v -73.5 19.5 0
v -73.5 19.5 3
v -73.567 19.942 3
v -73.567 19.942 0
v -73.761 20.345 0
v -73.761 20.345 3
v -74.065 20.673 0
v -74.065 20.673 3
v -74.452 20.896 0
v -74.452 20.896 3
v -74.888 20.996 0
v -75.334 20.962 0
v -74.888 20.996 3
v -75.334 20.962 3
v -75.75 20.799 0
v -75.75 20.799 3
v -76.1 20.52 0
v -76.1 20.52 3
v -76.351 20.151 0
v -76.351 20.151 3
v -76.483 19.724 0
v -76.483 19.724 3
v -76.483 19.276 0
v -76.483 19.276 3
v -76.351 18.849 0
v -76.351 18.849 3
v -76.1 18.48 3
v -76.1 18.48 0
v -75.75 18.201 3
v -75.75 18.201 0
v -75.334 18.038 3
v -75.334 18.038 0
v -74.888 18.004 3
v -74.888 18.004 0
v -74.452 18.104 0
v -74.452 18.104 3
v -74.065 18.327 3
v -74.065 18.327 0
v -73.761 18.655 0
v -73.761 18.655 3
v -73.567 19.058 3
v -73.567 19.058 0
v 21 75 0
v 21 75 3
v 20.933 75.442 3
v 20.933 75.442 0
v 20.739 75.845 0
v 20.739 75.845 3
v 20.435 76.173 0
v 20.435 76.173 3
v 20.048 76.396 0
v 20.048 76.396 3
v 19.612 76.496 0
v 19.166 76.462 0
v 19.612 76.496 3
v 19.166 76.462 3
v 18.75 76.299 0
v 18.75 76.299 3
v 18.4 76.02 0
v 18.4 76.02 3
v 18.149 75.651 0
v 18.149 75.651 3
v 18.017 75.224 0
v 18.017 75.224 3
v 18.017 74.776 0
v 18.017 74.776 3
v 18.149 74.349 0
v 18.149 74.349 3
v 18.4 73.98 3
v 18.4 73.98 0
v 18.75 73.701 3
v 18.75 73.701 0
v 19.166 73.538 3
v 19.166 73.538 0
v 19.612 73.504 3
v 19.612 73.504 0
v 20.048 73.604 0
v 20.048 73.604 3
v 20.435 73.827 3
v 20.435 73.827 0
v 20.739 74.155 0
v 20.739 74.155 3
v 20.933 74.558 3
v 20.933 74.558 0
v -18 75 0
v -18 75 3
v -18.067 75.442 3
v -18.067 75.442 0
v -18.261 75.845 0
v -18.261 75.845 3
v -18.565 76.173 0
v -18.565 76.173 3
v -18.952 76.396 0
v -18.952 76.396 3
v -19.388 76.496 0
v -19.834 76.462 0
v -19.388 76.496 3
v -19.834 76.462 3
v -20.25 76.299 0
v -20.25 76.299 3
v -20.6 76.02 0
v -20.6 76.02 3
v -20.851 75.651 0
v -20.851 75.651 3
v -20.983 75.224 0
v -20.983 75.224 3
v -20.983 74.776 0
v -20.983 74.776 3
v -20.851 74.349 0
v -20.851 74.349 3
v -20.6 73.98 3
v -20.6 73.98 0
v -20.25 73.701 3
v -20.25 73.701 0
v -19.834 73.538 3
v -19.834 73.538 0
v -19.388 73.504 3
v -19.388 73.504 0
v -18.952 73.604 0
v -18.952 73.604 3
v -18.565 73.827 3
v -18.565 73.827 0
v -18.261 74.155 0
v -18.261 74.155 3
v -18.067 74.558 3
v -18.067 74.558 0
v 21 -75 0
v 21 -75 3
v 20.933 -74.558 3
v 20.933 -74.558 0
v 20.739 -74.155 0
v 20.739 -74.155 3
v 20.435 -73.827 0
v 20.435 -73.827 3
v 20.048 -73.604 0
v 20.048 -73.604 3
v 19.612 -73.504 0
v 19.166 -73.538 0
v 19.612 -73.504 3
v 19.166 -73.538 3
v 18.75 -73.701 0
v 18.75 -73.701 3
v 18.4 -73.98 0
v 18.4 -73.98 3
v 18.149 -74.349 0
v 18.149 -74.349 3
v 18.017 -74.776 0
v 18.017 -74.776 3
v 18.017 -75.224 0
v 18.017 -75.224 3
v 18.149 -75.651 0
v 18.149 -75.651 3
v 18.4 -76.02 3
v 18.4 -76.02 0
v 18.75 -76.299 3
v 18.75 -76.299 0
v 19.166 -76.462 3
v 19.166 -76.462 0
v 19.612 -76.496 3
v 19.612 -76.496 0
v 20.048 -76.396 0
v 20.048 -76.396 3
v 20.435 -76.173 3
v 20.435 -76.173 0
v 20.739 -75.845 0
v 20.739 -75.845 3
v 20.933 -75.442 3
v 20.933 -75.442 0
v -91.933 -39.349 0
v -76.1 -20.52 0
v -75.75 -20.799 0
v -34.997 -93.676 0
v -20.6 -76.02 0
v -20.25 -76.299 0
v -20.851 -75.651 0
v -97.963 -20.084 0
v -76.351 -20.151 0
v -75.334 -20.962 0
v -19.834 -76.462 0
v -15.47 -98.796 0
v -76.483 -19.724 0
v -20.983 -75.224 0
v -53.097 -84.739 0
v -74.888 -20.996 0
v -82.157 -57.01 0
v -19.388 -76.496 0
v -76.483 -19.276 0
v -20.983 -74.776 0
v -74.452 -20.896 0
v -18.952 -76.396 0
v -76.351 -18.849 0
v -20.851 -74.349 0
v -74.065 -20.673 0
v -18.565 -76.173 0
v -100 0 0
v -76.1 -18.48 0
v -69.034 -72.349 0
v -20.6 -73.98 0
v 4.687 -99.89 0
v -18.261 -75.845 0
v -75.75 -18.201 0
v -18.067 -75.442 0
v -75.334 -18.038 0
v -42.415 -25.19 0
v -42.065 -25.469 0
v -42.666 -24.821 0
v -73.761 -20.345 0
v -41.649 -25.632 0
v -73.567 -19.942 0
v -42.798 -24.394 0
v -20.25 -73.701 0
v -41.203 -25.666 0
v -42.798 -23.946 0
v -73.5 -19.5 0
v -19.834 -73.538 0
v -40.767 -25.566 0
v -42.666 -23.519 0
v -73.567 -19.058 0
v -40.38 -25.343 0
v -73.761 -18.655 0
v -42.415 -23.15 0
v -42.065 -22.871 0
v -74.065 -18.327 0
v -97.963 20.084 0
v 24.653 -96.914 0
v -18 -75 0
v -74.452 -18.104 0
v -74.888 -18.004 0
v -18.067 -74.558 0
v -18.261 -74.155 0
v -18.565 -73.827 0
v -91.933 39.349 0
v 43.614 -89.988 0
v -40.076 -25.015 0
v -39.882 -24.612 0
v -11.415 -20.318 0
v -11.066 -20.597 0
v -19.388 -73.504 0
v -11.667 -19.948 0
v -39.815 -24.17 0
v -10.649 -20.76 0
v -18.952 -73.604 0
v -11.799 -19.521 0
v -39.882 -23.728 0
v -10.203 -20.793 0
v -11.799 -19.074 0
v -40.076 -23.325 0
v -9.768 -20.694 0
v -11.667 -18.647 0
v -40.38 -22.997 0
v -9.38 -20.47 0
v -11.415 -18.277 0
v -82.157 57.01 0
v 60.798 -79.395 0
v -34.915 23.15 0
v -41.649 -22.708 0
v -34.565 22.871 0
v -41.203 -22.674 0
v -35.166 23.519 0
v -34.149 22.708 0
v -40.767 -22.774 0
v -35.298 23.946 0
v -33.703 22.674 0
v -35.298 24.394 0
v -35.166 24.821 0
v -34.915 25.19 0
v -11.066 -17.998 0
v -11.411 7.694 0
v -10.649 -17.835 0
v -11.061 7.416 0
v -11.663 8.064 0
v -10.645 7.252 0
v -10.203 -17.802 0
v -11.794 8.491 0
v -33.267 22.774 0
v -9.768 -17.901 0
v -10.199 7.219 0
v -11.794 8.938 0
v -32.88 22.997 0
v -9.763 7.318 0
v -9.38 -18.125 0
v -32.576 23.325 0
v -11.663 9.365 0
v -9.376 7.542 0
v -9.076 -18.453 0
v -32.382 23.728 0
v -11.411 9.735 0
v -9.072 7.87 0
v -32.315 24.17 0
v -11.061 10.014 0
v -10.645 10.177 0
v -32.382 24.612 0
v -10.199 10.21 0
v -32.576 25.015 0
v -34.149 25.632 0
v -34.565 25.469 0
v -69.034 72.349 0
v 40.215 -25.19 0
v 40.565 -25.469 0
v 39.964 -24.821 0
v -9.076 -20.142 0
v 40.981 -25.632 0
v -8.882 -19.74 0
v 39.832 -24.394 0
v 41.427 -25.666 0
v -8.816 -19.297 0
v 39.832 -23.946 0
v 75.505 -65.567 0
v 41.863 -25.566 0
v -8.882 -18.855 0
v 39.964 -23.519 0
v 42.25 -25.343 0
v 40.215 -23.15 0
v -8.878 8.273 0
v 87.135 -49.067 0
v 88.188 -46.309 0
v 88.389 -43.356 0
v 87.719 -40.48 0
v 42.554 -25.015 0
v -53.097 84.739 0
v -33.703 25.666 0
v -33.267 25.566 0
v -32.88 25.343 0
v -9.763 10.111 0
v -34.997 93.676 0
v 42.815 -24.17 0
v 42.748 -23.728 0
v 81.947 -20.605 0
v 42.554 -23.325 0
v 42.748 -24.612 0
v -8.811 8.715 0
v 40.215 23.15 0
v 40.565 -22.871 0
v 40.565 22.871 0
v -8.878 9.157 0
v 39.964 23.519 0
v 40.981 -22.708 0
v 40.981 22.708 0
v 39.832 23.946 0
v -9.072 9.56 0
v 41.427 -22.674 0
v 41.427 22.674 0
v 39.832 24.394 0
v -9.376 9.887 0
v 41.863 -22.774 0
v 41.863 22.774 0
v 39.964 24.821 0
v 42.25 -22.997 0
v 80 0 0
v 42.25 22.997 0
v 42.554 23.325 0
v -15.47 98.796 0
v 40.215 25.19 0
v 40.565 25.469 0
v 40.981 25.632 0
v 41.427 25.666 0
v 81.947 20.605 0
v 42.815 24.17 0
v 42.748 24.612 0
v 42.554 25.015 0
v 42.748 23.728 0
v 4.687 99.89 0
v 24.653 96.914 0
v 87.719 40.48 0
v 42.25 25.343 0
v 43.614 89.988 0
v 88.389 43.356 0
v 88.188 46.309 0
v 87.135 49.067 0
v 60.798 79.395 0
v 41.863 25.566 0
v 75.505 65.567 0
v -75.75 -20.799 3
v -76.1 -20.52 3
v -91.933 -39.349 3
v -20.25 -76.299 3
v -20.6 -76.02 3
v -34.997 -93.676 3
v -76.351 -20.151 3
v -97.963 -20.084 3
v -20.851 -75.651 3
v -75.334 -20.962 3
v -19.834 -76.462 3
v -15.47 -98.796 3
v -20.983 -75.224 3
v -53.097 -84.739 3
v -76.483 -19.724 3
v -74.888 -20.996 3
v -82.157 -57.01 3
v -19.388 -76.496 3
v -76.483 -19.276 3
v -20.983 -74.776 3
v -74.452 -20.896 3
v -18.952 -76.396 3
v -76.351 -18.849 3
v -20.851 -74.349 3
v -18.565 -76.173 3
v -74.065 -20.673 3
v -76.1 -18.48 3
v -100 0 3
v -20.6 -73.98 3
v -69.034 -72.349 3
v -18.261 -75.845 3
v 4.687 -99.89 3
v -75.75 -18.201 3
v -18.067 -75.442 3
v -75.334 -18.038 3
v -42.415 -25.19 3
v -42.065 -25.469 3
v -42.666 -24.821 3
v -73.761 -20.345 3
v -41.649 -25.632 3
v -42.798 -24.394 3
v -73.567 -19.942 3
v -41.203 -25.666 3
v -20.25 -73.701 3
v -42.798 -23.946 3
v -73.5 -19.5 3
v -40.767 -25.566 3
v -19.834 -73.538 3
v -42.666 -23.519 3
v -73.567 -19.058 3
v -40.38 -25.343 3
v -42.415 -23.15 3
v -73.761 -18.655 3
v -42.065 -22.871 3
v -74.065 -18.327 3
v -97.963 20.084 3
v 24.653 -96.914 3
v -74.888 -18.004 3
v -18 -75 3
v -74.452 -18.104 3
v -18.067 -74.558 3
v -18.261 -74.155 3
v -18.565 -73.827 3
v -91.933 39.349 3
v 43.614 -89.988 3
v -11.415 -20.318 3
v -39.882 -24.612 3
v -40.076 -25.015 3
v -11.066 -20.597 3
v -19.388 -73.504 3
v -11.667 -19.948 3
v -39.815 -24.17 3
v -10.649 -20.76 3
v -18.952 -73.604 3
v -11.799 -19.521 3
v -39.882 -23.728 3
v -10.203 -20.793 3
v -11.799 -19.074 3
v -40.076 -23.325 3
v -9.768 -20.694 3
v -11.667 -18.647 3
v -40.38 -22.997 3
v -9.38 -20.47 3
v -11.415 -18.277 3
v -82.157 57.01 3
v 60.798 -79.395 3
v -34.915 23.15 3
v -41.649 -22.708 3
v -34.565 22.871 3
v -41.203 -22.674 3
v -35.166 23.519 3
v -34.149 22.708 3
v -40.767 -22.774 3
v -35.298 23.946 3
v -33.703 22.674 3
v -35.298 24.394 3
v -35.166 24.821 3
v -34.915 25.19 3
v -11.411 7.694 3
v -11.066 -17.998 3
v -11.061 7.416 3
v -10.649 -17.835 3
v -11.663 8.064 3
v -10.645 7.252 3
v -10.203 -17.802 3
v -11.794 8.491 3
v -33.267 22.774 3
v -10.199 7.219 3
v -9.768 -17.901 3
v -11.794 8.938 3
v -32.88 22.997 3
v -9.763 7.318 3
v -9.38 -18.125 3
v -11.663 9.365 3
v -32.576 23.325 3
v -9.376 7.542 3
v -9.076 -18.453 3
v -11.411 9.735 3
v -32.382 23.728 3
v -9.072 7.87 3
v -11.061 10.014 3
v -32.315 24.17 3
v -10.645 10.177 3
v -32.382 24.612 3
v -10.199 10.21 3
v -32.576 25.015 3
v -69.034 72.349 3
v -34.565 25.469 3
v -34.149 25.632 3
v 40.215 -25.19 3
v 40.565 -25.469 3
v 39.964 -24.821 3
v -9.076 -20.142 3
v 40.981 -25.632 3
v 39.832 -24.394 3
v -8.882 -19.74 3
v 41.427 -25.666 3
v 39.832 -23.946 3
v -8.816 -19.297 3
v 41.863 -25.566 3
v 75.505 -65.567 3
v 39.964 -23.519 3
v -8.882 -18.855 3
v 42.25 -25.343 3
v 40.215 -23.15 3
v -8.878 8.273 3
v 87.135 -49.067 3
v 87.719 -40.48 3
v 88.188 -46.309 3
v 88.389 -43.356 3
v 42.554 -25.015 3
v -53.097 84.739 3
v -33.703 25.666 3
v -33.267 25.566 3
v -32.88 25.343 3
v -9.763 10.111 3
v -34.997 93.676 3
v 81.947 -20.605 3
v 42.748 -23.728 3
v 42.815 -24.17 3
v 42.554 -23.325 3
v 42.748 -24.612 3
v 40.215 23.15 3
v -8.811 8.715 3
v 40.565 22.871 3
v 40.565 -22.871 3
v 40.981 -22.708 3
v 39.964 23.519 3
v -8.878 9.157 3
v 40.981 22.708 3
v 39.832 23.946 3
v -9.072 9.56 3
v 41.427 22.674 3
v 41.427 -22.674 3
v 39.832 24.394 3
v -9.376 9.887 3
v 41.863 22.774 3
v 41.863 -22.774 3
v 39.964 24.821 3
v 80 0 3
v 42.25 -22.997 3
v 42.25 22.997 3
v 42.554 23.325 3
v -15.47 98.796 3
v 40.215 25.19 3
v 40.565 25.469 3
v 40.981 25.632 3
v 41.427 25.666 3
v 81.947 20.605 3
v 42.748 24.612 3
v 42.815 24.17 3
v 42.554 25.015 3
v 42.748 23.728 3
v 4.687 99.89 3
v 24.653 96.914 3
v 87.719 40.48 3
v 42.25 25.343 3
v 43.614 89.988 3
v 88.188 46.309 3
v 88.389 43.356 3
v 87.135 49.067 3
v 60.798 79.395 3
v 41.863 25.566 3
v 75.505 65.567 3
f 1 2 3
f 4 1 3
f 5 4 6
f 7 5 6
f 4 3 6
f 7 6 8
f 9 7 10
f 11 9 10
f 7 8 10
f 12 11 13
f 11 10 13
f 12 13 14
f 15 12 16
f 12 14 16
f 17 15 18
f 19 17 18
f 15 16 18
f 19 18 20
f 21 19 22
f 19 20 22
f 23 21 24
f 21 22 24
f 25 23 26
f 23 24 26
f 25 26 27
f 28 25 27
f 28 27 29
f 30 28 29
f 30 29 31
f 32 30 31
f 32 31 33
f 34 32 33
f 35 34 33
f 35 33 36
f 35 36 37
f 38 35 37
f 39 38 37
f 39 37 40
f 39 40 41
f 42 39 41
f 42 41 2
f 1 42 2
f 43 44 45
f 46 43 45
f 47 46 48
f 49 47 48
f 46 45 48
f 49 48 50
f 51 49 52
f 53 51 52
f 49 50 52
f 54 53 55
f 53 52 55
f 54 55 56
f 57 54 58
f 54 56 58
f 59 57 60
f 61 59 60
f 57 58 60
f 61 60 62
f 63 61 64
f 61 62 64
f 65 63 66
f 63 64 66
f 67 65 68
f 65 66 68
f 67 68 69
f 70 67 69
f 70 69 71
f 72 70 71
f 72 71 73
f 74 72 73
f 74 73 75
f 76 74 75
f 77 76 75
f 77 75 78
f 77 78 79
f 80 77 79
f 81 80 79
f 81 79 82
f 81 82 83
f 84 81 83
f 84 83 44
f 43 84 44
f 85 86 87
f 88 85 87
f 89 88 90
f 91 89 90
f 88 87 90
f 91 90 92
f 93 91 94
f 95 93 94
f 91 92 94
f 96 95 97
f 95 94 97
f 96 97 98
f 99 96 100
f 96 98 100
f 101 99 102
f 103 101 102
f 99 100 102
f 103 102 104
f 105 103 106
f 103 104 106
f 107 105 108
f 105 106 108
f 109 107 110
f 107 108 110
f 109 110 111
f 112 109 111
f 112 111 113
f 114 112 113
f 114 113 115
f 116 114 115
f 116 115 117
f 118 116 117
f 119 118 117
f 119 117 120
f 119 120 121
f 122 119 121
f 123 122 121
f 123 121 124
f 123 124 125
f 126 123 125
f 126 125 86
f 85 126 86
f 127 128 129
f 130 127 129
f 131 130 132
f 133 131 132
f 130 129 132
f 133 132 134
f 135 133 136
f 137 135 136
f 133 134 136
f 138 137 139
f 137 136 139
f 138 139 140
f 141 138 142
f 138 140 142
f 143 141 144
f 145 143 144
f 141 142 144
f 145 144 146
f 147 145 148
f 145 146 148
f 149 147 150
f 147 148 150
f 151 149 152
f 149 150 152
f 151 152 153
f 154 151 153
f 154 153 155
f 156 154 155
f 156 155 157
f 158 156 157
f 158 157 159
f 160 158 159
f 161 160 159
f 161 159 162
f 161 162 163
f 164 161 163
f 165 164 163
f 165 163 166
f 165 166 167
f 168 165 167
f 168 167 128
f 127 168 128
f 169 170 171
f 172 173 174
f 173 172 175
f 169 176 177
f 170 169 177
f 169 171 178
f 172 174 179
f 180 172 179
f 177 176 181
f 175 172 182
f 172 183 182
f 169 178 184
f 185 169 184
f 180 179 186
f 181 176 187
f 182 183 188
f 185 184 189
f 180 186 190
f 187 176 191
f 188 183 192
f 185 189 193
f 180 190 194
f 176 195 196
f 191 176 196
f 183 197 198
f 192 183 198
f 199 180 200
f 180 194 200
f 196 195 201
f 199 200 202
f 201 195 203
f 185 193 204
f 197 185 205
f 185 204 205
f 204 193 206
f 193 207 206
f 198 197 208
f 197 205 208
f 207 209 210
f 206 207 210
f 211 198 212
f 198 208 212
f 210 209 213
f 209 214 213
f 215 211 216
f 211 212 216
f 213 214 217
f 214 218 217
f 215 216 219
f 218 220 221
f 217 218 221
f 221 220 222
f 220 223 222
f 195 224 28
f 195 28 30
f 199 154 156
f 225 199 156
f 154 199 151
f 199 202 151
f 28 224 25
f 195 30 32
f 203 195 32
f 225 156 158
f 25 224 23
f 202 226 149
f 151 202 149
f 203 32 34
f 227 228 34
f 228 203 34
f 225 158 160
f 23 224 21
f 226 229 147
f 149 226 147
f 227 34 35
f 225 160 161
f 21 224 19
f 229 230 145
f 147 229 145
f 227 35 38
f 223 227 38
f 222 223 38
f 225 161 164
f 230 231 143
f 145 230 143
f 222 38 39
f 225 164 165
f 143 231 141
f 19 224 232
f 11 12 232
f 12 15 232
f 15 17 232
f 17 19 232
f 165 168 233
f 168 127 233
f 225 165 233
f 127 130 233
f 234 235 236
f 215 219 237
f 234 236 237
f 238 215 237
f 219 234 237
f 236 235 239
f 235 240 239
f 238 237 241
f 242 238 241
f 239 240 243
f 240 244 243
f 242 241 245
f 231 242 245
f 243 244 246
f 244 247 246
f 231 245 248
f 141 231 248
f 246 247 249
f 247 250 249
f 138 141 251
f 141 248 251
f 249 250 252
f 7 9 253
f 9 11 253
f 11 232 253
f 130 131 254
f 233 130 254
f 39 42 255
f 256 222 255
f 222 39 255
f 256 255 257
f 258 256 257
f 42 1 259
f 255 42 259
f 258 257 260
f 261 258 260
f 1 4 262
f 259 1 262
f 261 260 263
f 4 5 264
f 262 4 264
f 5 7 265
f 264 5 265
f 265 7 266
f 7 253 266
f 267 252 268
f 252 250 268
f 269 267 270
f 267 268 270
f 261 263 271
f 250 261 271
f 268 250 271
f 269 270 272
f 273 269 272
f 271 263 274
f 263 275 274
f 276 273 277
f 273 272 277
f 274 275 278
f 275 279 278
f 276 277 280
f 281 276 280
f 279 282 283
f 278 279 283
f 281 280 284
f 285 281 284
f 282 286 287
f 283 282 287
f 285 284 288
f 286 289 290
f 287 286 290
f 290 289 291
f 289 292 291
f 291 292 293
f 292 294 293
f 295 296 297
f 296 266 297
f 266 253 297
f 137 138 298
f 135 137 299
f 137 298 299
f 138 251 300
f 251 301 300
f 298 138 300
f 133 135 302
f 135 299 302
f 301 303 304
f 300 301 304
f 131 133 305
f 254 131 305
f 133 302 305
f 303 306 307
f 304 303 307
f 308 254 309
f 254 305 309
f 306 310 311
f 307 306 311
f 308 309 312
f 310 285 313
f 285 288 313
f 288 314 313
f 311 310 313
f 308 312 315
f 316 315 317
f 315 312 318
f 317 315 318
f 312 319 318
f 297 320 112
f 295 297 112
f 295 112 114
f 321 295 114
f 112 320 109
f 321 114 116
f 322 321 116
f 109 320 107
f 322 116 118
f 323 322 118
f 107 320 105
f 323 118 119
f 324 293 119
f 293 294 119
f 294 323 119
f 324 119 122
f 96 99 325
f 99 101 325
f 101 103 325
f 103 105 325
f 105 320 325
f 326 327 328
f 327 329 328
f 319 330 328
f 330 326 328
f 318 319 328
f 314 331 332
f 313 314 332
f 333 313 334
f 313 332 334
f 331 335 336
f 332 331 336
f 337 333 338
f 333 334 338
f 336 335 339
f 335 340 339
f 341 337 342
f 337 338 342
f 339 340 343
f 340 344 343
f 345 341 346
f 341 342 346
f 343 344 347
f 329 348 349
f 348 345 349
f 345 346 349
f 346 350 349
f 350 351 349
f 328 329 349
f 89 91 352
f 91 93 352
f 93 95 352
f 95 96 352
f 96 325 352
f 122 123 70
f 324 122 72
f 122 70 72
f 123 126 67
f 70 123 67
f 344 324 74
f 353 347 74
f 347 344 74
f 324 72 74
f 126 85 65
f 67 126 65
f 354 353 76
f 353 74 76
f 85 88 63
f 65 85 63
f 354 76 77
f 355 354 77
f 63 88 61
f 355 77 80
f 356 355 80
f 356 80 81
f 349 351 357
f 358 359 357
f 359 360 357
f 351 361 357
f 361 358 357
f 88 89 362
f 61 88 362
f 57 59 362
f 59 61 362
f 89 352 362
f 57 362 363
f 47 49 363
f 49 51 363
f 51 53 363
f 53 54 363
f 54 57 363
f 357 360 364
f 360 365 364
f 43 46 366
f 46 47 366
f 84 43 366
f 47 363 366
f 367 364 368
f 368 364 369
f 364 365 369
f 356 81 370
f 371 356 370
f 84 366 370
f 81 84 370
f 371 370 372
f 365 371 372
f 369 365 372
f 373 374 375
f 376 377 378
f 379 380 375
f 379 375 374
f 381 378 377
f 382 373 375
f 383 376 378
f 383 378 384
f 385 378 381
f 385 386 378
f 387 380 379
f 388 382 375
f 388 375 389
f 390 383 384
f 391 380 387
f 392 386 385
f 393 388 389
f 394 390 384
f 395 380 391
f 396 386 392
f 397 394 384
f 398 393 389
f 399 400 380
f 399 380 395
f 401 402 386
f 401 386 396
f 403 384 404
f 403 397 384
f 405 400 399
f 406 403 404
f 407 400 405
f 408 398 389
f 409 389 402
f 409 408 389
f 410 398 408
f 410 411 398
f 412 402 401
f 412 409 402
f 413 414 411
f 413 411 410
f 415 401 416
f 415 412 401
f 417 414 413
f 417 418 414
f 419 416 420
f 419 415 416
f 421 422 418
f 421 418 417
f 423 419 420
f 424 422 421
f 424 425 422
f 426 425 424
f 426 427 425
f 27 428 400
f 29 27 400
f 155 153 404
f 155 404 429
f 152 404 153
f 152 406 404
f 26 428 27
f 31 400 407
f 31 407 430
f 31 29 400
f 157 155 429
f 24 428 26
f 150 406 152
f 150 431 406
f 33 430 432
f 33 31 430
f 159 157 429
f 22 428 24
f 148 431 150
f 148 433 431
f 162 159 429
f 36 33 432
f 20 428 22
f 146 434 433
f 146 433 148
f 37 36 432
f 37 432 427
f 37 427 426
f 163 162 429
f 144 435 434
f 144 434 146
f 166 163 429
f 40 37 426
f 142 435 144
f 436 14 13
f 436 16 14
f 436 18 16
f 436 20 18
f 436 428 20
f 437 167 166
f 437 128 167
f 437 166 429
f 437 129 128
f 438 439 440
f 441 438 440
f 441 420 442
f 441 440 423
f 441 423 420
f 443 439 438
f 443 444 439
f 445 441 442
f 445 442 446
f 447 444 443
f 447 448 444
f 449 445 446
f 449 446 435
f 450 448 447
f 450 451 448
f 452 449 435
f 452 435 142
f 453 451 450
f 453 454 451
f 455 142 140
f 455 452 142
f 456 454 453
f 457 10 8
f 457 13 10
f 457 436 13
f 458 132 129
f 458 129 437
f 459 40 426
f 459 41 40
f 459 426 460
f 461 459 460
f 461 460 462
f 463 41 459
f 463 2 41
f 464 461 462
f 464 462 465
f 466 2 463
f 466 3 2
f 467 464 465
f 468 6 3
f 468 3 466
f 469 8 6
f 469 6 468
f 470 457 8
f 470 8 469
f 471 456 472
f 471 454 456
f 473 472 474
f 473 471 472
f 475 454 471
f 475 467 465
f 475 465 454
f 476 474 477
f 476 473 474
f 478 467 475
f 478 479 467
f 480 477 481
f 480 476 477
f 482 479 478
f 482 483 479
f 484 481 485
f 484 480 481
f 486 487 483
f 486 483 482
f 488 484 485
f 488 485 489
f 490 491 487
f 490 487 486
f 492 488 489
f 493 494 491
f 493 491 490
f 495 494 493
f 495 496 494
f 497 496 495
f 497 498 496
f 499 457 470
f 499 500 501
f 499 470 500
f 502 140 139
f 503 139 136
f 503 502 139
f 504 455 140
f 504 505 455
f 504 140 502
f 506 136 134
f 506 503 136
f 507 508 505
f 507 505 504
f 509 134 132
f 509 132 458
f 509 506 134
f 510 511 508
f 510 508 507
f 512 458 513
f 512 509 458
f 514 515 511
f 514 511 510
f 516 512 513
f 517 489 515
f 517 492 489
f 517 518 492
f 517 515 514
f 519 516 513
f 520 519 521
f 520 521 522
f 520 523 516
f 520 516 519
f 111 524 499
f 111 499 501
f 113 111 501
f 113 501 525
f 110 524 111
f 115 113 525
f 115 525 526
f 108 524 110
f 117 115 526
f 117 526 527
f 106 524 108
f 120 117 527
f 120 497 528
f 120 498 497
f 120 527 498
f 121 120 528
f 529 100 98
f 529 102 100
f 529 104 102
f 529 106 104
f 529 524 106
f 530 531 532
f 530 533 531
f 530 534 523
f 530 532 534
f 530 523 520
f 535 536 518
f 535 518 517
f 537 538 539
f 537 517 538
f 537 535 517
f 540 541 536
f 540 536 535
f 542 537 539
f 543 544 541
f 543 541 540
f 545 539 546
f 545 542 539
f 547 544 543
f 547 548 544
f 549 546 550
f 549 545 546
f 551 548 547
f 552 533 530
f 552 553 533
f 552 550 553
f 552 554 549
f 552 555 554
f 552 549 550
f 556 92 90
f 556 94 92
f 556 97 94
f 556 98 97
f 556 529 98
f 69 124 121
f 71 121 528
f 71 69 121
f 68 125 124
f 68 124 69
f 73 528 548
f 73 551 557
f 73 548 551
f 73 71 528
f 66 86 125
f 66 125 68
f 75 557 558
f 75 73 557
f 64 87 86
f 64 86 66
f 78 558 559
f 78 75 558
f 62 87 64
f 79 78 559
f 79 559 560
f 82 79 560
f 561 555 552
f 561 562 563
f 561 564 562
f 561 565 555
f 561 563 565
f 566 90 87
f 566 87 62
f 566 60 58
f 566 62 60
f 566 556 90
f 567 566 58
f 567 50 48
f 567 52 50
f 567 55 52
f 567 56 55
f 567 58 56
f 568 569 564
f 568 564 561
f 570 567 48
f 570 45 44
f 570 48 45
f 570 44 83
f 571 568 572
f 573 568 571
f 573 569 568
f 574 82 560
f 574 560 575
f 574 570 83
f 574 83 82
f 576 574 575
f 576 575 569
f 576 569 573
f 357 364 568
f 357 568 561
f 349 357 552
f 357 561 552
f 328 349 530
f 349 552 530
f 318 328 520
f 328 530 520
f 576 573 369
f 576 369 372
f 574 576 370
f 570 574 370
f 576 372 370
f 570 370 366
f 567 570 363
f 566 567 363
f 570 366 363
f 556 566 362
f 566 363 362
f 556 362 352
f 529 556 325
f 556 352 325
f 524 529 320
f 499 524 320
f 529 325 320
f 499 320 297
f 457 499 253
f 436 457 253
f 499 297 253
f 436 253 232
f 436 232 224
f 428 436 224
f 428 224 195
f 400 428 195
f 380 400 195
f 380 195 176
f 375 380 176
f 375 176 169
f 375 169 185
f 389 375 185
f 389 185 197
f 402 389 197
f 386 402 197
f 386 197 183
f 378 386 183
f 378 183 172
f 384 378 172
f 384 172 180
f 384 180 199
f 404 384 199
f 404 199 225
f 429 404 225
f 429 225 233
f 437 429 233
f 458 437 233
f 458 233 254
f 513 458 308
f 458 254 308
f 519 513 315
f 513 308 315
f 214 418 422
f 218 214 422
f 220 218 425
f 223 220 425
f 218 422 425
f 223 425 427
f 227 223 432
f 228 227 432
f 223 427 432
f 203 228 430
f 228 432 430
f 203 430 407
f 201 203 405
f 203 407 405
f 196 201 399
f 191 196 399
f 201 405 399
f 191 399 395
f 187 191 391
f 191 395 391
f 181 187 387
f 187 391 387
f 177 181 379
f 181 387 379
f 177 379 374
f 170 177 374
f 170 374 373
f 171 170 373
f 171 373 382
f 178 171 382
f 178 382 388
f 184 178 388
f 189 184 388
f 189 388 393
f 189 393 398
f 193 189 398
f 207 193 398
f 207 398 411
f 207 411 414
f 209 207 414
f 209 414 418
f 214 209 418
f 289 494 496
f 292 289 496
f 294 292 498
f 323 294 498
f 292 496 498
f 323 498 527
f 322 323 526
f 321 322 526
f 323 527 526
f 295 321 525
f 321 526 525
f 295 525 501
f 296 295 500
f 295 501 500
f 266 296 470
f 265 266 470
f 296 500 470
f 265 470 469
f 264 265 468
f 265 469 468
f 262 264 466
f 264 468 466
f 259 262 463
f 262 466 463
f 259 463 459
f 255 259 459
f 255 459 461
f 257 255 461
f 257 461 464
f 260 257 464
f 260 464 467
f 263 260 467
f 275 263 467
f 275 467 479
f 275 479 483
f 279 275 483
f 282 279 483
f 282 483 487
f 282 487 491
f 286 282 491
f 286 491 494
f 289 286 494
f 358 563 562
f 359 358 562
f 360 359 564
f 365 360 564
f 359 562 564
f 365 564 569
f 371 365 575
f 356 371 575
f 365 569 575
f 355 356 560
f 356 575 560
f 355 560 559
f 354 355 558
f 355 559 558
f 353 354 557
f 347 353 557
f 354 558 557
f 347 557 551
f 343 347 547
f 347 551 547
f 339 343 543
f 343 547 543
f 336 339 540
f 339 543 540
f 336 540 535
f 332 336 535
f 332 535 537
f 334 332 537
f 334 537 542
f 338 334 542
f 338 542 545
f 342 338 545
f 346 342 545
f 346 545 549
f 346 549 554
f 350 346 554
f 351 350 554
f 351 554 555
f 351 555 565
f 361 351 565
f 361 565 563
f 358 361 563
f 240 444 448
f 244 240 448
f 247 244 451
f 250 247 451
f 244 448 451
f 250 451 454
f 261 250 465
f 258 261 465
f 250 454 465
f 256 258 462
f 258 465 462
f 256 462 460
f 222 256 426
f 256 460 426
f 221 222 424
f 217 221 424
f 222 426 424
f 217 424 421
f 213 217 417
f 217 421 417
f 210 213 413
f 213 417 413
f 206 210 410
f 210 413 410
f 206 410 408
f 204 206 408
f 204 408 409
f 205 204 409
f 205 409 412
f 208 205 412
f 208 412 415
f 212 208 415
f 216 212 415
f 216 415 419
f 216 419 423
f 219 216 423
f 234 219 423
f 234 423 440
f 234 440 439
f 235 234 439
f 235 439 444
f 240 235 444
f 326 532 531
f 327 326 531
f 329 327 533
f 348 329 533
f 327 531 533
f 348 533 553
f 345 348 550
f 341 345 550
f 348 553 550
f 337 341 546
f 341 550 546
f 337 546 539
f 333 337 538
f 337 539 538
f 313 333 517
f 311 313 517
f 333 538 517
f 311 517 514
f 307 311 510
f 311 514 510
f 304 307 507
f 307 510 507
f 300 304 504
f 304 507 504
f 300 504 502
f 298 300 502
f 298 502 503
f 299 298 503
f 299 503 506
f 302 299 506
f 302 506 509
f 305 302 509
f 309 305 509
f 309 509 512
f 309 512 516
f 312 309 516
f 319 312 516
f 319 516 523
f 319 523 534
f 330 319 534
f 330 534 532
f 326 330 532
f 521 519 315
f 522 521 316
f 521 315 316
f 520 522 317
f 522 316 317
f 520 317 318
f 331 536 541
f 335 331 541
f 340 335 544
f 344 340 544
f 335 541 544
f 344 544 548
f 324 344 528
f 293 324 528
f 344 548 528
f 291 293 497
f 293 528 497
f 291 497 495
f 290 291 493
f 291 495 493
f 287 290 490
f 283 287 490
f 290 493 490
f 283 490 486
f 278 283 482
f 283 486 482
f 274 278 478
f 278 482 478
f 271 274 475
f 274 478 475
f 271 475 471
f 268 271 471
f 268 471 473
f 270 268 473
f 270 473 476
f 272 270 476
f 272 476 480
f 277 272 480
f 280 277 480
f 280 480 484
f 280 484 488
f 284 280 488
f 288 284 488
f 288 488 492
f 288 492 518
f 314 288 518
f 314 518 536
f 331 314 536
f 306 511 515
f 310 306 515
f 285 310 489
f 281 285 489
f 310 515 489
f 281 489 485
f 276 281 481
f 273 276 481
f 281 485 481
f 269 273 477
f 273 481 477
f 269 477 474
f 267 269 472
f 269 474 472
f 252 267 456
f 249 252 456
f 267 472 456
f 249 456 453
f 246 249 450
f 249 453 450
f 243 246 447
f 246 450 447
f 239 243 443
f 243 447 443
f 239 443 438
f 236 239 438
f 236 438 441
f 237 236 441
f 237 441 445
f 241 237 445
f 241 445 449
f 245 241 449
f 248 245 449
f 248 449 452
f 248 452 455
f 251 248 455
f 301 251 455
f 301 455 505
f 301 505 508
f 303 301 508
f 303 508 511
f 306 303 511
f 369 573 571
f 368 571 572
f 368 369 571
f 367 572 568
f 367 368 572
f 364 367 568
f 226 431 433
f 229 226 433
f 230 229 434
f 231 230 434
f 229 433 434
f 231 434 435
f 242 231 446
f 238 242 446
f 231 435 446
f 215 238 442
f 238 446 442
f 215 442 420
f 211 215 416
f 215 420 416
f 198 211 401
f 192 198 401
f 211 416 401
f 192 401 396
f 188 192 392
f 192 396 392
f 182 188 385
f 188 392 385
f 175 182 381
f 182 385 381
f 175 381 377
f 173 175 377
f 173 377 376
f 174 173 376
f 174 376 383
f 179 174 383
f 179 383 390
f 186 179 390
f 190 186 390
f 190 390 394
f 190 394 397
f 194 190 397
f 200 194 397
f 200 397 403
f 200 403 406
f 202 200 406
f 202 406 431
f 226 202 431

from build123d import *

# Parameters (mm, degrees)
CROQUIS1_R              = 100
SALIENTE_EXTRUIR1_DEPTH = 3
CROQUIS3_R              = 110
CORTAR_EXTRUIR1_DEPTH   = 3
REDONDEO1_R             = 10
CROQUIS4_R              = 1.5
CORTAR_EXTRUIR2_DEPTH   = 142.453172607
CROQUIS5_R              = 1.5
CORTAR_EXTRUIR3_DEPTH   = 142.453172607


with BuildPart() as part:
    # Croquis1 → Saliente-Extruir1 (new body)
    with BuildSketch(Plane.XY):
        Circle(CROQUIS1_R)
    extrude(amount=SALIENTE_EXTRUIR1_DEPTH)

    # Croquis3 → Cortar-Extruir1 (cut)
    with BuildSketch(Plane.XY.offset(3)):
        with Locations((190, 0)):
            Circle(CROQUIS3_R)
    extrude(amount=-CORTAR_EXTRUIR1_DEPTH, mode=Mode.SUBTRACT)

    # Redondeo1
    redondeo1_edges = [part.edges().sort_by_distance(p)[0] for p in [
        (89.473684211, -44.659375654, 1.5),
        (89.473684211, 44.659375654, 1.5),
    ]]
    fillet(redondeo1_edges, radius=REDONDEO1_R)

    # Croquis4 → Cortar-Extruir2 (cut, through all)
    with BuildSketch(Plane.XY.offset(3)):
        with Locations((-33.815, 24.17)):
            Circle(CROQUIS4_R)
        with Locations((-41.315, -24.17)):
            Circle(CROQUIS4_R)
        with Locations((41.315, -24.17)):
            Circle(CROQUIS4_R)
        with Locations((41.315, 24.17)):
            Circle(CROQUIS4_R)
        with Locations((-10.31559482, -19.297497716)):
            Circle(CROQUIS4_R)
        with Locations((-10.311195262, 8.714642909)):
            Circle(CROQUIS4_R)
    extrude(amount=-CORTAR_EXTRUIR2_DEPTH, mode=Mode.SUBTRACT)

    # Croquis5 → Cortar-Extruir3 (cut, through all)
    with BuildSketch(Plane.XY.offset(3)):
        with Locations((-75, 19.5)):
            Circle(CROQUIS5_R)
        with Locations((-75, -19.5)):
            Circle(CROQUIS5_R)
        with Locations((19.5, 75)):
            Circle(CROQUIS5_R)
        with Locations((-19.5, 75)):
            Circle(CROQUIS5_R)
        with Locations((-19.5, -75)):
            Circle(CROQUIS5_R)
        with Locations((19.5, -75)):
            Circle(CROQUIS5_R)
    extrude(amount=-CORTAR_EXTRUIR3_DEPTH, mode=Mode.SUBTRACT)


solid = part.part
